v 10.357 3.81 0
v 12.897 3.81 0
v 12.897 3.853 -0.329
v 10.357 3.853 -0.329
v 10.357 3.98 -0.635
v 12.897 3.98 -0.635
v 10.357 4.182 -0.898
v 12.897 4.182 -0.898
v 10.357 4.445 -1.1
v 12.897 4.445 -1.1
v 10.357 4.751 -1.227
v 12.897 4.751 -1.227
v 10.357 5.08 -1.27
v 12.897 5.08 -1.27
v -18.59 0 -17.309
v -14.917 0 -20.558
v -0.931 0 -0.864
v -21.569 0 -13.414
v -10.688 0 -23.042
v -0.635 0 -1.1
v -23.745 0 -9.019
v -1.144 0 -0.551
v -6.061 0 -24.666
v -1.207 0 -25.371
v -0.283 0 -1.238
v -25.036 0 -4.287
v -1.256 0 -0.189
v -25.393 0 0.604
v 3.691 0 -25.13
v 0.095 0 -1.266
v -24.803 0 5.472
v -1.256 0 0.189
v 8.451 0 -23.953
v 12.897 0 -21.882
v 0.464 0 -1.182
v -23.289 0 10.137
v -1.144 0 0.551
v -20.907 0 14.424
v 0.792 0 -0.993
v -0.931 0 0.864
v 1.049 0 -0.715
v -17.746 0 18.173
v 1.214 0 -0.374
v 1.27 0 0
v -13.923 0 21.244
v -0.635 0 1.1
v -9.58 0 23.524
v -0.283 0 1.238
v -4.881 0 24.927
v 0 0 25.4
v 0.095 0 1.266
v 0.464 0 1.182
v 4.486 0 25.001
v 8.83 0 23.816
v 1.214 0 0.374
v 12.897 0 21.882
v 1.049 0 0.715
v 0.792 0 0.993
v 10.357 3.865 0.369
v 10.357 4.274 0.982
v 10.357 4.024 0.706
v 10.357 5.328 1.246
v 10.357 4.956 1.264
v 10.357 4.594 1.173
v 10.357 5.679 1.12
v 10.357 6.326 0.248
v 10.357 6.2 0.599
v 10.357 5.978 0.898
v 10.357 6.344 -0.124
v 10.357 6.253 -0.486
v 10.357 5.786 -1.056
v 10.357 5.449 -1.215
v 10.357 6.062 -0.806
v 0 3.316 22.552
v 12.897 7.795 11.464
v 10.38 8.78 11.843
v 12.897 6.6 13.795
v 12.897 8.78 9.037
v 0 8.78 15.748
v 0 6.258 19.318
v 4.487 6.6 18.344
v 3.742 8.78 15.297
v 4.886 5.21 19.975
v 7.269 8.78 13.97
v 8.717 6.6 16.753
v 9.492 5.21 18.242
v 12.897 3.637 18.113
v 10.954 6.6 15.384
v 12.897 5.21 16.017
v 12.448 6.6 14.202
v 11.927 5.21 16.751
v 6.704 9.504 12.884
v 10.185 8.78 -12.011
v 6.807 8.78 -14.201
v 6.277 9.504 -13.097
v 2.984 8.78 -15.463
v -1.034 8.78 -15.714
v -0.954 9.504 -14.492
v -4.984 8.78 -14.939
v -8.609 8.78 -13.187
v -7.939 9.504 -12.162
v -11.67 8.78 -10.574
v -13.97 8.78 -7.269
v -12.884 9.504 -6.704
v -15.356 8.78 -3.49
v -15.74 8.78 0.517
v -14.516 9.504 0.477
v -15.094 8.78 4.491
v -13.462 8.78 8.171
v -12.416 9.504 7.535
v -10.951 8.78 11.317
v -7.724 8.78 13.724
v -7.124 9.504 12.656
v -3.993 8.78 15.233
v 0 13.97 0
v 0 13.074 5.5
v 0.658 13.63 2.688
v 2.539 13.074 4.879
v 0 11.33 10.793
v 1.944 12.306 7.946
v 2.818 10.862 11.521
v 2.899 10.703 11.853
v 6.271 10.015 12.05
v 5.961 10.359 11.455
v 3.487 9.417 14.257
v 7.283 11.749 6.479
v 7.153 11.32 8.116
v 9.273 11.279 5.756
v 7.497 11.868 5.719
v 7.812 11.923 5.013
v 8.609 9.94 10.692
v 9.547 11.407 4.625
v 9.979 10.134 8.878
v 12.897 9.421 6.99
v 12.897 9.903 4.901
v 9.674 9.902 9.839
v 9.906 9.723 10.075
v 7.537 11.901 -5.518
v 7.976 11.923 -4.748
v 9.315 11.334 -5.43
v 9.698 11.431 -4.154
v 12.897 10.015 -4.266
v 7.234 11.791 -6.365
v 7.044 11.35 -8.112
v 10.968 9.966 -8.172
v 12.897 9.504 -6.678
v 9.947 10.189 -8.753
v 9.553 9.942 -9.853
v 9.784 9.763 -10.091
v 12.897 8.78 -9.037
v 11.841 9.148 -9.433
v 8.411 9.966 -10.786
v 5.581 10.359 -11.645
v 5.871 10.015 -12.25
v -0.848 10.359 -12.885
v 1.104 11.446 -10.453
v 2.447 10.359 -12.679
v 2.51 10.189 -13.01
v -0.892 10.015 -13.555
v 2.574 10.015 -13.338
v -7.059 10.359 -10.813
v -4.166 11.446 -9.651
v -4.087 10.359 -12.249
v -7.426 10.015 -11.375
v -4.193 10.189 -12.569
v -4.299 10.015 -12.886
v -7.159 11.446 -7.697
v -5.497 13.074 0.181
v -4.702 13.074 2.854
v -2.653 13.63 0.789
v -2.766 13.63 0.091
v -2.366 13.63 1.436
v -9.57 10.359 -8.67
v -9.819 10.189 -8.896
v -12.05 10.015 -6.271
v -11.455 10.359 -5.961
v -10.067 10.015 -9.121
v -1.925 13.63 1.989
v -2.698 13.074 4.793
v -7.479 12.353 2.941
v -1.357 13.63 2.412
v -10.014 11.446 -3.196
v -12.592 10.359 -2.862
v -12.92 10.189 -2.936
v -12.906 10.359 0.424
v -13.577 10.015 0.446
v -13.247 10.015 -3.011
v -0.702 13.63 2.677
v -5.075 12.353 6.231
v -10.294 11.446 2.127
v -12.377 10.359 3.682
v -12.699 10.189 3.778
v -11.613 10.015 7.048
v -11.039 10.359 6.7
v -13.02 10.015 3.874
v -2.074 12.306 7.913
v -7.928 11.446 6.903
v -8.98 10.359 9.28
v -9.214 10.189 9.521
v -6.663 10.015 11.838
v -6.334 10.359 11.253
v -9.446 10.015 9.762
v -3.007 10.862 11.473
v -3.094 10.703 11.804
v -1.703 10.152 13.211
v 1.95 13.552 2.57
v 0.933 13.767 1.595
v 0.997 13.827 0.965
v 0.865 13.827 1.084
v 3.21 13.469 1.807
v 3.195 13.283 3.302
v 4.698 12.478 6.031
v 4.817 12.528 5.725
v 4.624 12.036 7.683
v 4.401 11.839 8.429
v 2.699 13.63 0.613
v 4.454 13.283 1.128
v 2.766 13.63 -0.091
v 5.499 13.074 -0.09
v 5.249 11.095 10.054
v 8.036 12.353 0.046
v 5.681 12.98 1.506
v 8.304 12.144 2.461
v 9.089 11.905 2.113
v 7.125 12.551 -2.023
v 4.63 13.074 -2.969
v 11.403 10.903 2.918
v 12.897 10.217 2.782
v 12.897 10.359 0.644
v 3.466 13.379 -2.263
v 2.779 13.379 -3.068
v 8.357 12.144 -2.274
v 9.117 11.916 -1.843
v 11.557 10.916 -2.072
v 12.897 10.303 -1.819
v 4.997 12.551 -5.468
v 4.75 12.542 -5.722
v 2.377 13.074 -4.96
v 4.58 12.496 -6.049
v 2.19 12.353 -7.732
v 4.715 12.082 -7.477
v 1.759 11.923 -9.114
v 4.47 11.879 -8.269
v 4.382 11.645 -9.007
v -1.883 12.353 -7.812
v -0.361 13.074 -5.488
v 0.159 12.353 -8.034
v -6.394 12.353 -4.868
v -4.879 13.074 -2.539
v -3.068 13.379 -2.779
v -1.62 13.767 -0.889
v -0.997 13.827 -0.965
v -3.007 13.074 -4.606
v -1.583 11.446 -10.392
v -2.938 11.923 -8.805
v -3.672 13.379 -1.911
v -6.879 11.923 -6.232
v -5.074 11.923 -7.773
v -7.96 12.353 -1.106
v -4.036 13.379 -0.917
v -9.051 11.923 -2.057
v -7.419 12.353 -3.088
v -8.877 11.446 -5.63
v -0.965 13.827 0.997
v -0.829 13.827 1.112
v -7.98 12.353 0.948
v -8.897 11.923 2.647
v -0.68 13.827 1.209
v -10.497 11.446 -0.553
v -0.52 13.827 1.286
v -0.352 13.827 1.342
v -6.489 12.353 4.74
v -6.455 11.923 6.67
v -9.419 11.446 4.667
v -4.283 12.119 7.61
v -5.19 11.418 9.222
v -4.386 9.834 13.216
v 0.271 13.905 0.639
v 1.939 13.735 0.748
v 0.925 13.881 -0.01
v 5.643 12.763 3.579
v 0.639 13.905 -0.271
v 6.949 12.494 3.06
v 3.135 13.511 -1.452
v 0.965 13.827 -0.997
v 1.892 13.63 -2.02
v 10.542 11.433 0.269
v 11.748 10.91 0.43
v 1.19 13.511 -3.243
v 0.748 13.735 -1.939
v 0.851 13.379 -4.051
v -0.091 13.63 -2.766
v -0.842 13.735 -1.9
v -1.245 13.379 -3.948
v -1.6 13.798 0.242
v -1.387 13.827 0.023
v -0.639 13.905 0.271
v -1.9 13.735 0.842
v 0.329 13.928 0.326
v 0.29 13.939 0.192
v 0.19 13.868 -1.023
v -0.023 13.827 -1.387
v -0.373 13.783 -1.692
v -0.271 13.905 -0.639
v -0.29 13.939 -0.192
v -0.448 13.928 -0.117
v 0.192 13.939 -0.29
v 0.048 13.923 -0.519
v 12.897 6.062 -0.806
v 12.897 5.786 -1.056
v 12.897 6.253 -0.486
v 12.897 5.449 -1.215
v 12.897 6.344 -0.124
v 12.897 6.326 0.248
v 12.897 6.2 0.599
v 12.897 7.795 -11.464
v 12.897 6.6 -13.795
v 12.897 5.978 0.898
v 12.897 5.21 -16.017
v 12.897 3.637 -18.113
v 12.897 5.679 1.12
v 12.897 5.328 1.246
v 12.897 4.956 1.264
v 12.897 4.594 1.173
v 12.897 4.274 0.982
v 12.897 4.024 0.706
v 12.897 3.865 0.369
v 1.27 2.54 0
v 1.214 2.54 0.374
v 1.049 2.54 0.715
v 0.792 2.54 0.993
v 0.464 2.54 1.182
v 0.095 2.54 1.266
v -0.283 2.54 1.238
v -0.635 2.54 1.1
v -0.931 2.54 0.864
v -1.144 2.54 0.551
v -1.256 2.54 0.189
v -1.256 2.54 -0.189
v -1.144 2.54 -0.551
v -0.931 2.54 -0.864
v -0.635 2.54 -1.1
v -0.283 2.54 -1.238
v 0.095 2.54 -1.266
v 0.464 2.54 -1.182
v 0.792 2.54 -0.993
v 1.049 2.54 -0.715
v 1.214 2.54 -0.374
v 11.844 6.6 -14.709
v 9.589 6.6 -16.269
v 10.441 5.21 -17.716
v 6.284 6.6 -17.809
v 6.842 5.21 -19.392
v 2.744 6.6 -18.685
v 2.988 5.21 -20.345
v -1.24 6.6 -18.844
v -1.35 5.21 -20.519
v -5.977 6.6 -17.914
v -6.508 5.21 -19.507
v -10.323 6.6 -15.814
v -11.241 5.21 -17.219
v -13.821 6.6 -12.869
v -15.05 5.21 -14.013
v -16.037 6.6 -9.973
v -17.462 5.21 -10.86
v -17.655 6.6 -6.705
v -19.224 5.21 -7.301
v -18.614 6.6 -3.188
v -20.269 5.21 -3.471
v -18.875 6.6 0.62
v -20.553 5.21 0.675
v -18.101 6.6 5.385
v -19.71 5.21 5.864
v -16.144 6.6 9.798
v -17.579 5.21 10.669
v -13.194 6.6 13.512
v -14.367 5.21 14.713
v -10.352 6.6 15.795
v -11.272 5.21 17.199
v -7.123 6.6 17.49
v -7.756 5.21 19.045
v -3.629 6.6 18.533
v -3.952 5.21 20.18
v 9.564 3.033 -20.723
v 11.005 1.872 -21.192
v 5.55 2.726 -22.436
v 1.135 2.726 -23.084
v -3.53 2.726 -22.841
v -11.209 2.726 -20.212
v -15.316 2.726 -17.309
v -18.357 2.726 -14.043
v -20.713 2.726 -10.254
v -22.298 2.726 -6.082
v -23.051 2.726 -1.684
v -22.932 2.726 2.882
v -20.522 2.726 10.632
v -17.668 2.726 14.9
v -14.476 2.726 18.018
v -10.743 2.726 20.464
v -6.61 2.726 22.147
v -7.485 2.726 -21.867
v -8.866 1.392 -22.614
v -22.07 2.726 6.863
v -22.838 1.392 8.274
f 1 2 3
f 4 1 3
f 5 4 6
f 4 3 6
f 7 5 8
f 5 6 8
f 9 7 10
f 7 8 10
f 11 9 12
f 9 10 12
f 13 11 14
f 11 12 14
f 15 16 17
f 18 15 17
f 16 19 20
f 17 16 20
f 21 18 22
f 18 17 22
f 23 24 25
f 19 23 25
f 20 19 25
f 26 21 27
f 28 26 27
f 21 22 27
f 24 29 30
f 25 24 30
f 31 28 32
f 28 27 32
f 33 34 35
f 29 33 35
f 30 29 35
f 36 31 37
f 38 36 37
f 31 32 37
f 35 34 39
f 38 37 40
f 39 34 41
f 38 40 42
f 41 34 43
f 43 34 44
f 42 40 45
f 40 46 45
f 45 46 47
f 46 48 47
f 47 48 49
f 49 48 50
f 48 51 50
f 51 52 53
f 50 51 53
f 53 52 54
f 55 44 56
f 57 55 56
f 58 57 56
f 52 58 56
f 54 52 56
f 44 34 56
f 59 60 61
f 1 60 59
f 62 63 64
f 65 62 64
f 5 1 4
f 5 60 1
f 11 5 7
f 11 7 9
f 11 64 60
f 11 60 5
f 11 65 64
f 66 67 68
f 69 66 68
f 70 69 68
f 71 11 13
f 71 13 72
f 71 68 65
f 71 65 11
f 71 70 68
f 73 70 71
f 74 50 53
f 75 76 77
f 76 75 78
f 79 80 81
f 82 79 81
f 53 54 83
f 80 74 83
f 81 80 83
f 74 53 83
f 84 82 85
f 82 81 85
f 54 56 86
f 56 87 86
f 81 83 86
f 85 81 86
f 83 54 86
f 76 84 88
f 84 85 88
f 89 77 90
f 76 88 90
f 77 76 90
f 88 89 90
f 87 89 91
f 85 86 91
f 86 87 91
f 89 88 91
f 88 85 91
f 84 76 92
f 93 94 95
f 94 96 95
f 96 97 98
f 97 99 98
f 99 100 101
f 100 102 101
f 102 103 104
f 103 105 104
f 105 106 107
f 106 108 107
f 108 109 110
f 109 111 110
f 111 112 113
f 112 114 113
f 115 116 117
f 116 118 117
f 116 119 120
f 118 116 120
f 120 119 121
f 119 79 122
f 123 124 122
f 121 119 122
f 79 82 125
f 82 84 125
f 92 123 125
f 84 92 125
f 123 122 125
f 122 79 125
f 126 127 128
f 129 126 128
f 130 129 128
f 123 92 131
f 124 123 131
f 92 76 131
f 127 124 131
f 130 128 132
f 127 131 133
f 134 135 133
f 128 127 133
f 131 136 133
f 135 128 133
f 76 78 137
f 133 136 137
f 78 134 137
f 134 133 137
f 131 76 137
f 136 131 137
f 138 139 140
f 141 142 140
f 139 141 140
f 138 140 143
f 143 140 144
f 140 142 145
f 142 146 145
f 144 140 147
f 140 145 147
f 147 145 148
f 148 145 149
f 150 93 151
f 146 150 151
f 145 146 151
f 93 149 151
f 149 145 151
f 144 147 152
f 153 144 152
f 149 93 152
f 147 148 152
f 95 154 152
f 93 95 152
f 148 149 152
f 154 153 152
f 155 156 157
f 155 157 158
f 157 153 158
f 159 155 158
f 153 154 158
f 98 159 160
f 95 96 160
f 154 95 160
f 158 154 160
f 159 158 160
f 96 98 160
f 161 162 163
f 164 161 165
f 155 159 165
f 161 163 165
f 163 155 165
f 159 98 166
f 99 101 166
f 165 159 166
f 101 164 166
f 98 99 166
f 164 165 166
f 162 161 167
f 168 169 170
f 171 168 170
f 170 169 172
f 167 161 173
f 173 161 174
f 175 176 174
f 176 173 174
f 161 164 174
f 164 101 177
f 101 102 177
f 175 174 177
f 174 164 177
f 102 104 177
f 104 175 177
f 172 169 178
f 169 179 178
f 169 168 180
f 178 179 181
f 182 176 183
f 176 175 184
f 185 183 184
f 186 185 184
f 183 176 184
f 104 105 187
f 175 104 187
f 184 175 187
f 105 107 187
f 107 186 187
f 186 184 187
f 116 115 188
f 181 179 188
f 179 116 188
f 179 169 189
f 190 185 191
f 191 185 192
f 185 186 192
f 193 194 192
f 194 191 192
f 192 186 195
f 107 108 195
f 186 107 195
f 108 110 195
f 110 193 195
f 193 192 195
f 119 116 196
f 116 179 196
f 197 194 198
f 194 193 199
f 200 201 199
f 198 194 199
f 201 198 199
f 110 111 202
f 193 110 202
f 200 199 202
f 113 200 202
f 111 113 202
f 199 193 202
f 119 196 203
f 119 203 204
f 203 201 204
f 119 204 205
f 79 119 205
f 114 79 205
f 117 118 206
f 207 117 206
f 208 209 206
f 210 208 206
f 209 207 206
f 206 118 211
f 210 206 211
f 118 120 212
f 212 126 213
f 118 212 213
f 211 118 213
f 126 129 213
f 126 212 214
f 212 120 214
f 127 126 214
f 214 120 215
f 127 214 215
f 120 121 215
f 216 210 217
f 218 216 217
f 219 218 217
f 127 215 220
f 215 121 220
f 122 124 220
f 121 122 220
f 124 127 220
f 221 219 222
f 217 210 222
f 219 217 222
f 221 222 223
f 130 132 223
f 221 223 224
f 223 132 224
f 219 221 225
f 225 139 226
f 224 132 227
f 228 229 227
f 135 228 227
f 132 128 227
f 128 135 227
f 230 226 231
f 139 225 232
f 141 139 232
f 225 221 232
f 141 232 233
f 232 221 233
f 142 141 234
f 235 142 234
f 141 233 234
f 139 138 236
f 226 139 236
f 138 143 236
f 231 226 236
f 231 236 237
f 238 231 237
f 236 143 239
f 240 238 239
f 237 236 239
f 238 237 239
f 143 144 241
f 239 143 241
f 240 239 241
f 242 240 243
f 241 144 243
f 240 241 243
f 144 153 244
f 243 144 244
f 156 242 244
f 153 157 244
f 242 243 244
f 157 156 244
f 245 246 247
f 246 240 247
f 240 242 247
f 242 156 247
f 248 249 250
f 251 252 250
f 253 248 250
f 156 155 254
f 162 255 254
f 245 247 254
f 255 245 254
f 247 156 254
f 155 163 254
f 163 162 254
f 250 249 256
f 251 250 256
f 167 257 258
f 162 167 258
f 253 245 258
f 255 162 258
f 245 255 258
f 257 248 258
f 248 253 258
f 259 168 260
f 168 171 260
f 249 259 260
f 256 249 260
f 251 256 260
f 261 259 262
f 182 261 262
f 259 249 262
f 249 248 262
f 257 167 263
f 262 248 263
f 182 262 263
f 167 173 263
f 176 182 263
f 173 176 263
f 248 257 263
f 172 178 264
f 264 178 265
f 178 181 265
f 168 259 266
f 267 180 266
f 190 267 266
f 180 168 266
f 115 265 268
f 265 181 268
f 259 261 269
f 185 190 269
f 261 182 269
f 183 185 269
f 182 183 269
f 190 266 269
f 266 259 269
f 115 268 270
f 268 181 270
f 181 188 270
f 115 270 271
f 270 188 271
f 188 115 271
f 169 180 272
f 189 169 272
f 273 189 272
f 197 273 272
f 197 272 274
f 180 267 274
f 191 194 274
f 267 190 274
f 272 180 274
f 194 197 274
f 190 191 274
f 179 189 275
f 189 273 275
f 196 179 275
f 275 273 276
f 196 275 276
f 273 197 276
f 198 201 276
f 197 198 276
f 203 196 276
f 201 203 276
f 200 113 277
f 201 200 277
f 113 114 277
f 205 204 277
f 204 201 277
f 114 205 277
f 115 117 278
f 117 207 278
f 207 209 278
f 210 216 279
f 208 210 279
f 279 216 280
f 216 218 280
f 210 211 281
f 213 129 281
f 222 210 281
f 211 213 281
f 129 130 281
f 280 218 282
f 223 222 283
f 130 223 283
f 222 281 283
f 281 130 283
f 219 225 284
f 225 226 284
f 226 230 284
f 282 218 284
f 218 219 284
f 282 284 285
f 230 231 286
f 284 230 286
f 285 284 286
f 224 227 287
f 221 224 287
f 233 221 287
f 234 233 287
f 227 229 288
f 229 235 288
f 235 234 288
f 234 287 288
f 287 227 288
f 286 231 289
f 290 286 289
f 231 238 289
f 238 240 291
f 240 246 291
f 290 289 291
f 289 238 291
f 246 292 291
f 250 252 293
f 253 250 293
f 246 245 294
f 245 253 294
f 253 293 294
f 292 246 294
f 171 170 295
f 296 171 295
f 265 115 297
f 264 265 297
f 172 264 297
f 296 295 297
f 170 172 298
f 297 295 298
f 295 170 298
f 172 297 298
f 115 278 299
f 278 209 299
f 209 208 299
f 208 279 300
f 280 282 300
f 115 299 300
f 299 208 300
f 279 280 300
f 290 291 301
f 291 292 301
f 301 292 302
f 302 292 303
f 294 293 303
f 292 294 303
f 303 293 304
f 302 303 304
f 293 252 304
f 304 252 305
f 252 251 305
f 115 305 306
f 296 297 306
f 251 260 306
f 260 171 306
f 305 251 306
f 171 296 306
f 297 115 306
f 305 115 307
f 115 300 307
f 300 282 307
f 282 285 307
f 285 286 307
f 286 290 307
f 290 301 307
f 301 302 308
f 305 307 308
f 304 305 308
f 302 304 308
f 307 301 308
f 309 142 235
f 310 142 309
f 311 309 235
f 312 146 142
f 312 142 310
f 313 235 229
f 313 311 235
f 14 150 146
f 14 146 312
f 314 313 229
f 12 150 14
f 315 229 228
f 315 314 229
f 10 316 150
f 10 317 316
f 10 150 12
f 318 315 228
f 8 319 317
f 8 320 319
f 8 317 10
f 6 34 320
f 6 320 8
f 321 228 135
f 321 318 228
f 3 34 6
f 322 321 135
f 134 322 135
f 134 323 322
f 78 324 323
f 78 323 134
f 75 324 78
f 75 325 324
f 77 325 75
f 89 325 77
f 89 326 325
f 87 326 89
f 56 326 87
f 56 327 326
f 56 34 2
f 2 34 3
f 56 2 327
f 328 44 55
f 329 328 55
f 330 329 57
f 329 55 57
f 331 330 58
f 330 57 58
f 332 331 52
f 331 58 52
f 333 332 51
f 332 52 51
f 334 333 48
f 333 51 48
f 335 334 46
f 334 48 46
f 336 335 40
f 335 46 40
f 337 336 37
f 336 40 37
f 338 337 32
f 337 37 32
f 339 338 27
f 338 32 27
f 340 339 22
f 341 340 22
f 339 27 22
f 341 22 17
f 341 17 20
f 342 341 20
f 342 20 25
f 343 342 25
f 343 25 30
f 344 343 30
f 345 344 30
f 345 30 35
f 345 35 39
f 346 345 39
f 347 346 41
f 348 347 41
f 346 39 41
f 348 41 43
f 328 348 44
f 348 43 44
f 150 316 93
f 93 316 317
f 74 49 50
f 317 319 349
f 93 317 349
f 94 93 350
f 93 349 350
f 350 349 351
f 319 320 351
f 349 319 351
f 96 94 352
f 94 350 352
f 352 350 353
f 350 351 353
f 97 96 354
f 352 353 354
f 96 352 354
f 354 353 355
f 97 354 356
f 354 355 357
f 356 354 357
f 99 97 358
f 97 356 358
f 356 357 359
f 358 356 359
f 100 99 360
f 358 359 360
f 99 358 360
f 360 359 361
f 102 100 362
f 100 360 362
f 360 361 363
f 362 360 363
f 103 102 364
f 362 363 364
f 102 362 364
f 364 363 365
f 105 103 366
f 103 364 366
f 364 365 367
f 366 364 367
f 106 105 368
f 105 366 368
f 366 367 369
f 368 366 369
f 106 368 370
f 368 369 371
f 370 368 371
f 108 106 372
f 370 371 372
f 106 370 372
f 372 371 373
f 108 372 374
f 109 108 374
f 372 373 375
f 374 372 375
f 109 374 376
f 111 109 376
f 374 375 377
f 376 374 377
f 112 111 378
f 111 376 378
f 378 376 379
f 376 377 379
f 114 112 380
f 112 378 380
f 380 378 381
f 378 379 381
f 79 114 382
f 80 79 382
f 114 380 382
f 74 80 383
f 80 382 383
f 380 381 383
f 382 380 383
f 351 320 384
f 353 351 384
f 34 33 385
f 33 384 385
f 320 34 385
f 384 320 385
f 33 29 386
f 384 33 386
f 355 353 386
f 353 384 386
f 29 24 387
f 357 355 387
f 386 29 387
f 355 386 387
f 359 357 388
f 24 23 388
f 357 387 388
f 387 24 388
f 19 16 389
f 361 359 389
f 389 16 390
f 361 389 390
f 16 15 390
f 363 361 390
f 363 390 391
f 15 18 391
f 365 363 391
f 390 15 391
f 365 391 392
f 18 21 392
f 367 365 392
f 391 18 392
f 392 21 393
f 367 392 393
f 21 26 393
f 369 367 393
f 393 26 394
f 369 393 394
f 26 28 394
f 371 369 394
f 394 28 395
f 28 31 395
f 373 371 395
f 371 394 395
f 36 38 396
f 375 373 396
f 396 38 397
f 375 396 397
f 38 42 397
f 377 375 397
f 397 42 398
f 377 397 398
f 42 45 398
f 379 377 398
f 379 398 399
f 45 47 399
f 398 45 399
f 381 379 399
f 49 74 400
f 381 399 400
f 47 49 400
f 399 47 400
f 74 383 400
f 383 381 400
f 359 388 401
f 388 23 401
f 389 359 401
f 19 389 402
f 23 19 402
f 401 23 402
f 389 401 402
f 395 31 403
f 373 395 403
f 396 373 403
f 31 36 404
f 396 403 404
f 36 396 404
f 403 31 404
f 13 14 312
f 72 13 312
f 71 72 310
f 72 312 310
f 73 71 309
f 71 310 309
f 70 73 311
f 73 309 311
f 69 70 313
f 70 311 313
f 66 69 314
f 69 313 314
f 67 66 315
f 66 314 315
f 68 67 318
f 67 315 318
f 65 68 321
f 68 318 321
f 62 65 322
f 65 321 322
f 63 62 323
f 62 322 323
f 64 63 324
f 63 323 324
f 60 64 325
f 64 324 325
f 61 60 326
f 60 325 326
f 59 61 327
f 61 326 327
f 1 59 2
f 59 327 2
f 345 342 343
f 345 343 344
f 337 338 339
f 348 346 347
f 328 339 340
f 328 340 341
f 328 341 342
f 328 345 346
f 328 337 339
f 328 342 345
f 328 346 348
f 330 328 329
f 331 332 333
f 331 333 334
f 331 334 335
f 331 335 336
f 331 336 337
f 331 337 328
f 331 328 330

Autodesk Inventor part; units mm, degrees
ref_plane "YZ Plane" through (0, 0, 0) normal (1, 0, 0) x (0, 1, 0)
ref_plane "XZ Plane" through (0, 0, 0) normal (0, 1, 0) x (-1, 0, 0)
ref_plane "XY Plane" through (0, 0, 0) normal (0, 0, 1) x (1, 0, 0)
sketch "Sketch1" plane through (0, 0, 0) normal (1, 0, 0) x (0, 1, 0)
  line L0 (0, 0) -> (0, 25.4)
  line L1 (0, 0) -> (13.97, 0)
  arc A0 (13.97, 0) -> (0, 25.4) centre (-21.4675, -2.9489) ccw
  line L2 (0, 0) -> (0, 15.748)
  line L3 (0, 15.748) -> (8.7805, 15.748)
  dimension "d0" = 25.4
  dimension "d1" = 13.97
  dimension "d2" = 35.56
  dimension "d3" = 15.748
revolve "Revolution1" add sketch "Sketch1" angle 360 about axis through (0, 0, 0) along (0, 1, 0)
sketch "Sketch4" plane through (0, 0, 0) normal (0, -1, 0) x (1, 0, 0)
  line L0 (0, 0) -> (12.897, 0)
  line L1 (12.897, 0) -> (12.897, 21.8821)
  circle A0 centre (0, 0) radius 25.4 projected
  line L2 (12.897, 21.8821) -> (38.6124, 21.8821)
  line L3 (38.6124, 21.8821) -> (38.6124, -32.9808)
  line L4 (38.6124, -32.9808) -> (12.897, -32.9808)
  line L5 (12.897, -32.9808) -> (12.897, 21.8821)
  dimension "d12" = 21.8821
extrude "Extrusion3" cut sketch "Sketch4" against normal through all contours L1 A0 L5 | L2 L3 L4 L5 A0 picked at (14.3084, 13.5451)
sketch "Sketch5" plane through (12.897, 0, 21.8821) normal (1, 0, 0) x (0, 0, -1)
  line L0 (21.8821, 0) -> (21.8821, 5.08)
  circle A0 centre (21.8821, 5.08) radius 1.27
  dimension "d15" = 5.08
  dimension "d16" = 2.54
extrude "Extrusion4" cut sketch "Sketch5" against normal blind 2.54
sketch "Sketch6" plane through (0, 0, 0) normal (0, -1, 0) x (1, 0, 0)
  circle A0 centre (0, 0) radius 1.27
  dimension "d19" = 2.54
extrude "Extrusion5" cut sketch "Sketch6" against normal blind 2.54
properties part number "camera side"
